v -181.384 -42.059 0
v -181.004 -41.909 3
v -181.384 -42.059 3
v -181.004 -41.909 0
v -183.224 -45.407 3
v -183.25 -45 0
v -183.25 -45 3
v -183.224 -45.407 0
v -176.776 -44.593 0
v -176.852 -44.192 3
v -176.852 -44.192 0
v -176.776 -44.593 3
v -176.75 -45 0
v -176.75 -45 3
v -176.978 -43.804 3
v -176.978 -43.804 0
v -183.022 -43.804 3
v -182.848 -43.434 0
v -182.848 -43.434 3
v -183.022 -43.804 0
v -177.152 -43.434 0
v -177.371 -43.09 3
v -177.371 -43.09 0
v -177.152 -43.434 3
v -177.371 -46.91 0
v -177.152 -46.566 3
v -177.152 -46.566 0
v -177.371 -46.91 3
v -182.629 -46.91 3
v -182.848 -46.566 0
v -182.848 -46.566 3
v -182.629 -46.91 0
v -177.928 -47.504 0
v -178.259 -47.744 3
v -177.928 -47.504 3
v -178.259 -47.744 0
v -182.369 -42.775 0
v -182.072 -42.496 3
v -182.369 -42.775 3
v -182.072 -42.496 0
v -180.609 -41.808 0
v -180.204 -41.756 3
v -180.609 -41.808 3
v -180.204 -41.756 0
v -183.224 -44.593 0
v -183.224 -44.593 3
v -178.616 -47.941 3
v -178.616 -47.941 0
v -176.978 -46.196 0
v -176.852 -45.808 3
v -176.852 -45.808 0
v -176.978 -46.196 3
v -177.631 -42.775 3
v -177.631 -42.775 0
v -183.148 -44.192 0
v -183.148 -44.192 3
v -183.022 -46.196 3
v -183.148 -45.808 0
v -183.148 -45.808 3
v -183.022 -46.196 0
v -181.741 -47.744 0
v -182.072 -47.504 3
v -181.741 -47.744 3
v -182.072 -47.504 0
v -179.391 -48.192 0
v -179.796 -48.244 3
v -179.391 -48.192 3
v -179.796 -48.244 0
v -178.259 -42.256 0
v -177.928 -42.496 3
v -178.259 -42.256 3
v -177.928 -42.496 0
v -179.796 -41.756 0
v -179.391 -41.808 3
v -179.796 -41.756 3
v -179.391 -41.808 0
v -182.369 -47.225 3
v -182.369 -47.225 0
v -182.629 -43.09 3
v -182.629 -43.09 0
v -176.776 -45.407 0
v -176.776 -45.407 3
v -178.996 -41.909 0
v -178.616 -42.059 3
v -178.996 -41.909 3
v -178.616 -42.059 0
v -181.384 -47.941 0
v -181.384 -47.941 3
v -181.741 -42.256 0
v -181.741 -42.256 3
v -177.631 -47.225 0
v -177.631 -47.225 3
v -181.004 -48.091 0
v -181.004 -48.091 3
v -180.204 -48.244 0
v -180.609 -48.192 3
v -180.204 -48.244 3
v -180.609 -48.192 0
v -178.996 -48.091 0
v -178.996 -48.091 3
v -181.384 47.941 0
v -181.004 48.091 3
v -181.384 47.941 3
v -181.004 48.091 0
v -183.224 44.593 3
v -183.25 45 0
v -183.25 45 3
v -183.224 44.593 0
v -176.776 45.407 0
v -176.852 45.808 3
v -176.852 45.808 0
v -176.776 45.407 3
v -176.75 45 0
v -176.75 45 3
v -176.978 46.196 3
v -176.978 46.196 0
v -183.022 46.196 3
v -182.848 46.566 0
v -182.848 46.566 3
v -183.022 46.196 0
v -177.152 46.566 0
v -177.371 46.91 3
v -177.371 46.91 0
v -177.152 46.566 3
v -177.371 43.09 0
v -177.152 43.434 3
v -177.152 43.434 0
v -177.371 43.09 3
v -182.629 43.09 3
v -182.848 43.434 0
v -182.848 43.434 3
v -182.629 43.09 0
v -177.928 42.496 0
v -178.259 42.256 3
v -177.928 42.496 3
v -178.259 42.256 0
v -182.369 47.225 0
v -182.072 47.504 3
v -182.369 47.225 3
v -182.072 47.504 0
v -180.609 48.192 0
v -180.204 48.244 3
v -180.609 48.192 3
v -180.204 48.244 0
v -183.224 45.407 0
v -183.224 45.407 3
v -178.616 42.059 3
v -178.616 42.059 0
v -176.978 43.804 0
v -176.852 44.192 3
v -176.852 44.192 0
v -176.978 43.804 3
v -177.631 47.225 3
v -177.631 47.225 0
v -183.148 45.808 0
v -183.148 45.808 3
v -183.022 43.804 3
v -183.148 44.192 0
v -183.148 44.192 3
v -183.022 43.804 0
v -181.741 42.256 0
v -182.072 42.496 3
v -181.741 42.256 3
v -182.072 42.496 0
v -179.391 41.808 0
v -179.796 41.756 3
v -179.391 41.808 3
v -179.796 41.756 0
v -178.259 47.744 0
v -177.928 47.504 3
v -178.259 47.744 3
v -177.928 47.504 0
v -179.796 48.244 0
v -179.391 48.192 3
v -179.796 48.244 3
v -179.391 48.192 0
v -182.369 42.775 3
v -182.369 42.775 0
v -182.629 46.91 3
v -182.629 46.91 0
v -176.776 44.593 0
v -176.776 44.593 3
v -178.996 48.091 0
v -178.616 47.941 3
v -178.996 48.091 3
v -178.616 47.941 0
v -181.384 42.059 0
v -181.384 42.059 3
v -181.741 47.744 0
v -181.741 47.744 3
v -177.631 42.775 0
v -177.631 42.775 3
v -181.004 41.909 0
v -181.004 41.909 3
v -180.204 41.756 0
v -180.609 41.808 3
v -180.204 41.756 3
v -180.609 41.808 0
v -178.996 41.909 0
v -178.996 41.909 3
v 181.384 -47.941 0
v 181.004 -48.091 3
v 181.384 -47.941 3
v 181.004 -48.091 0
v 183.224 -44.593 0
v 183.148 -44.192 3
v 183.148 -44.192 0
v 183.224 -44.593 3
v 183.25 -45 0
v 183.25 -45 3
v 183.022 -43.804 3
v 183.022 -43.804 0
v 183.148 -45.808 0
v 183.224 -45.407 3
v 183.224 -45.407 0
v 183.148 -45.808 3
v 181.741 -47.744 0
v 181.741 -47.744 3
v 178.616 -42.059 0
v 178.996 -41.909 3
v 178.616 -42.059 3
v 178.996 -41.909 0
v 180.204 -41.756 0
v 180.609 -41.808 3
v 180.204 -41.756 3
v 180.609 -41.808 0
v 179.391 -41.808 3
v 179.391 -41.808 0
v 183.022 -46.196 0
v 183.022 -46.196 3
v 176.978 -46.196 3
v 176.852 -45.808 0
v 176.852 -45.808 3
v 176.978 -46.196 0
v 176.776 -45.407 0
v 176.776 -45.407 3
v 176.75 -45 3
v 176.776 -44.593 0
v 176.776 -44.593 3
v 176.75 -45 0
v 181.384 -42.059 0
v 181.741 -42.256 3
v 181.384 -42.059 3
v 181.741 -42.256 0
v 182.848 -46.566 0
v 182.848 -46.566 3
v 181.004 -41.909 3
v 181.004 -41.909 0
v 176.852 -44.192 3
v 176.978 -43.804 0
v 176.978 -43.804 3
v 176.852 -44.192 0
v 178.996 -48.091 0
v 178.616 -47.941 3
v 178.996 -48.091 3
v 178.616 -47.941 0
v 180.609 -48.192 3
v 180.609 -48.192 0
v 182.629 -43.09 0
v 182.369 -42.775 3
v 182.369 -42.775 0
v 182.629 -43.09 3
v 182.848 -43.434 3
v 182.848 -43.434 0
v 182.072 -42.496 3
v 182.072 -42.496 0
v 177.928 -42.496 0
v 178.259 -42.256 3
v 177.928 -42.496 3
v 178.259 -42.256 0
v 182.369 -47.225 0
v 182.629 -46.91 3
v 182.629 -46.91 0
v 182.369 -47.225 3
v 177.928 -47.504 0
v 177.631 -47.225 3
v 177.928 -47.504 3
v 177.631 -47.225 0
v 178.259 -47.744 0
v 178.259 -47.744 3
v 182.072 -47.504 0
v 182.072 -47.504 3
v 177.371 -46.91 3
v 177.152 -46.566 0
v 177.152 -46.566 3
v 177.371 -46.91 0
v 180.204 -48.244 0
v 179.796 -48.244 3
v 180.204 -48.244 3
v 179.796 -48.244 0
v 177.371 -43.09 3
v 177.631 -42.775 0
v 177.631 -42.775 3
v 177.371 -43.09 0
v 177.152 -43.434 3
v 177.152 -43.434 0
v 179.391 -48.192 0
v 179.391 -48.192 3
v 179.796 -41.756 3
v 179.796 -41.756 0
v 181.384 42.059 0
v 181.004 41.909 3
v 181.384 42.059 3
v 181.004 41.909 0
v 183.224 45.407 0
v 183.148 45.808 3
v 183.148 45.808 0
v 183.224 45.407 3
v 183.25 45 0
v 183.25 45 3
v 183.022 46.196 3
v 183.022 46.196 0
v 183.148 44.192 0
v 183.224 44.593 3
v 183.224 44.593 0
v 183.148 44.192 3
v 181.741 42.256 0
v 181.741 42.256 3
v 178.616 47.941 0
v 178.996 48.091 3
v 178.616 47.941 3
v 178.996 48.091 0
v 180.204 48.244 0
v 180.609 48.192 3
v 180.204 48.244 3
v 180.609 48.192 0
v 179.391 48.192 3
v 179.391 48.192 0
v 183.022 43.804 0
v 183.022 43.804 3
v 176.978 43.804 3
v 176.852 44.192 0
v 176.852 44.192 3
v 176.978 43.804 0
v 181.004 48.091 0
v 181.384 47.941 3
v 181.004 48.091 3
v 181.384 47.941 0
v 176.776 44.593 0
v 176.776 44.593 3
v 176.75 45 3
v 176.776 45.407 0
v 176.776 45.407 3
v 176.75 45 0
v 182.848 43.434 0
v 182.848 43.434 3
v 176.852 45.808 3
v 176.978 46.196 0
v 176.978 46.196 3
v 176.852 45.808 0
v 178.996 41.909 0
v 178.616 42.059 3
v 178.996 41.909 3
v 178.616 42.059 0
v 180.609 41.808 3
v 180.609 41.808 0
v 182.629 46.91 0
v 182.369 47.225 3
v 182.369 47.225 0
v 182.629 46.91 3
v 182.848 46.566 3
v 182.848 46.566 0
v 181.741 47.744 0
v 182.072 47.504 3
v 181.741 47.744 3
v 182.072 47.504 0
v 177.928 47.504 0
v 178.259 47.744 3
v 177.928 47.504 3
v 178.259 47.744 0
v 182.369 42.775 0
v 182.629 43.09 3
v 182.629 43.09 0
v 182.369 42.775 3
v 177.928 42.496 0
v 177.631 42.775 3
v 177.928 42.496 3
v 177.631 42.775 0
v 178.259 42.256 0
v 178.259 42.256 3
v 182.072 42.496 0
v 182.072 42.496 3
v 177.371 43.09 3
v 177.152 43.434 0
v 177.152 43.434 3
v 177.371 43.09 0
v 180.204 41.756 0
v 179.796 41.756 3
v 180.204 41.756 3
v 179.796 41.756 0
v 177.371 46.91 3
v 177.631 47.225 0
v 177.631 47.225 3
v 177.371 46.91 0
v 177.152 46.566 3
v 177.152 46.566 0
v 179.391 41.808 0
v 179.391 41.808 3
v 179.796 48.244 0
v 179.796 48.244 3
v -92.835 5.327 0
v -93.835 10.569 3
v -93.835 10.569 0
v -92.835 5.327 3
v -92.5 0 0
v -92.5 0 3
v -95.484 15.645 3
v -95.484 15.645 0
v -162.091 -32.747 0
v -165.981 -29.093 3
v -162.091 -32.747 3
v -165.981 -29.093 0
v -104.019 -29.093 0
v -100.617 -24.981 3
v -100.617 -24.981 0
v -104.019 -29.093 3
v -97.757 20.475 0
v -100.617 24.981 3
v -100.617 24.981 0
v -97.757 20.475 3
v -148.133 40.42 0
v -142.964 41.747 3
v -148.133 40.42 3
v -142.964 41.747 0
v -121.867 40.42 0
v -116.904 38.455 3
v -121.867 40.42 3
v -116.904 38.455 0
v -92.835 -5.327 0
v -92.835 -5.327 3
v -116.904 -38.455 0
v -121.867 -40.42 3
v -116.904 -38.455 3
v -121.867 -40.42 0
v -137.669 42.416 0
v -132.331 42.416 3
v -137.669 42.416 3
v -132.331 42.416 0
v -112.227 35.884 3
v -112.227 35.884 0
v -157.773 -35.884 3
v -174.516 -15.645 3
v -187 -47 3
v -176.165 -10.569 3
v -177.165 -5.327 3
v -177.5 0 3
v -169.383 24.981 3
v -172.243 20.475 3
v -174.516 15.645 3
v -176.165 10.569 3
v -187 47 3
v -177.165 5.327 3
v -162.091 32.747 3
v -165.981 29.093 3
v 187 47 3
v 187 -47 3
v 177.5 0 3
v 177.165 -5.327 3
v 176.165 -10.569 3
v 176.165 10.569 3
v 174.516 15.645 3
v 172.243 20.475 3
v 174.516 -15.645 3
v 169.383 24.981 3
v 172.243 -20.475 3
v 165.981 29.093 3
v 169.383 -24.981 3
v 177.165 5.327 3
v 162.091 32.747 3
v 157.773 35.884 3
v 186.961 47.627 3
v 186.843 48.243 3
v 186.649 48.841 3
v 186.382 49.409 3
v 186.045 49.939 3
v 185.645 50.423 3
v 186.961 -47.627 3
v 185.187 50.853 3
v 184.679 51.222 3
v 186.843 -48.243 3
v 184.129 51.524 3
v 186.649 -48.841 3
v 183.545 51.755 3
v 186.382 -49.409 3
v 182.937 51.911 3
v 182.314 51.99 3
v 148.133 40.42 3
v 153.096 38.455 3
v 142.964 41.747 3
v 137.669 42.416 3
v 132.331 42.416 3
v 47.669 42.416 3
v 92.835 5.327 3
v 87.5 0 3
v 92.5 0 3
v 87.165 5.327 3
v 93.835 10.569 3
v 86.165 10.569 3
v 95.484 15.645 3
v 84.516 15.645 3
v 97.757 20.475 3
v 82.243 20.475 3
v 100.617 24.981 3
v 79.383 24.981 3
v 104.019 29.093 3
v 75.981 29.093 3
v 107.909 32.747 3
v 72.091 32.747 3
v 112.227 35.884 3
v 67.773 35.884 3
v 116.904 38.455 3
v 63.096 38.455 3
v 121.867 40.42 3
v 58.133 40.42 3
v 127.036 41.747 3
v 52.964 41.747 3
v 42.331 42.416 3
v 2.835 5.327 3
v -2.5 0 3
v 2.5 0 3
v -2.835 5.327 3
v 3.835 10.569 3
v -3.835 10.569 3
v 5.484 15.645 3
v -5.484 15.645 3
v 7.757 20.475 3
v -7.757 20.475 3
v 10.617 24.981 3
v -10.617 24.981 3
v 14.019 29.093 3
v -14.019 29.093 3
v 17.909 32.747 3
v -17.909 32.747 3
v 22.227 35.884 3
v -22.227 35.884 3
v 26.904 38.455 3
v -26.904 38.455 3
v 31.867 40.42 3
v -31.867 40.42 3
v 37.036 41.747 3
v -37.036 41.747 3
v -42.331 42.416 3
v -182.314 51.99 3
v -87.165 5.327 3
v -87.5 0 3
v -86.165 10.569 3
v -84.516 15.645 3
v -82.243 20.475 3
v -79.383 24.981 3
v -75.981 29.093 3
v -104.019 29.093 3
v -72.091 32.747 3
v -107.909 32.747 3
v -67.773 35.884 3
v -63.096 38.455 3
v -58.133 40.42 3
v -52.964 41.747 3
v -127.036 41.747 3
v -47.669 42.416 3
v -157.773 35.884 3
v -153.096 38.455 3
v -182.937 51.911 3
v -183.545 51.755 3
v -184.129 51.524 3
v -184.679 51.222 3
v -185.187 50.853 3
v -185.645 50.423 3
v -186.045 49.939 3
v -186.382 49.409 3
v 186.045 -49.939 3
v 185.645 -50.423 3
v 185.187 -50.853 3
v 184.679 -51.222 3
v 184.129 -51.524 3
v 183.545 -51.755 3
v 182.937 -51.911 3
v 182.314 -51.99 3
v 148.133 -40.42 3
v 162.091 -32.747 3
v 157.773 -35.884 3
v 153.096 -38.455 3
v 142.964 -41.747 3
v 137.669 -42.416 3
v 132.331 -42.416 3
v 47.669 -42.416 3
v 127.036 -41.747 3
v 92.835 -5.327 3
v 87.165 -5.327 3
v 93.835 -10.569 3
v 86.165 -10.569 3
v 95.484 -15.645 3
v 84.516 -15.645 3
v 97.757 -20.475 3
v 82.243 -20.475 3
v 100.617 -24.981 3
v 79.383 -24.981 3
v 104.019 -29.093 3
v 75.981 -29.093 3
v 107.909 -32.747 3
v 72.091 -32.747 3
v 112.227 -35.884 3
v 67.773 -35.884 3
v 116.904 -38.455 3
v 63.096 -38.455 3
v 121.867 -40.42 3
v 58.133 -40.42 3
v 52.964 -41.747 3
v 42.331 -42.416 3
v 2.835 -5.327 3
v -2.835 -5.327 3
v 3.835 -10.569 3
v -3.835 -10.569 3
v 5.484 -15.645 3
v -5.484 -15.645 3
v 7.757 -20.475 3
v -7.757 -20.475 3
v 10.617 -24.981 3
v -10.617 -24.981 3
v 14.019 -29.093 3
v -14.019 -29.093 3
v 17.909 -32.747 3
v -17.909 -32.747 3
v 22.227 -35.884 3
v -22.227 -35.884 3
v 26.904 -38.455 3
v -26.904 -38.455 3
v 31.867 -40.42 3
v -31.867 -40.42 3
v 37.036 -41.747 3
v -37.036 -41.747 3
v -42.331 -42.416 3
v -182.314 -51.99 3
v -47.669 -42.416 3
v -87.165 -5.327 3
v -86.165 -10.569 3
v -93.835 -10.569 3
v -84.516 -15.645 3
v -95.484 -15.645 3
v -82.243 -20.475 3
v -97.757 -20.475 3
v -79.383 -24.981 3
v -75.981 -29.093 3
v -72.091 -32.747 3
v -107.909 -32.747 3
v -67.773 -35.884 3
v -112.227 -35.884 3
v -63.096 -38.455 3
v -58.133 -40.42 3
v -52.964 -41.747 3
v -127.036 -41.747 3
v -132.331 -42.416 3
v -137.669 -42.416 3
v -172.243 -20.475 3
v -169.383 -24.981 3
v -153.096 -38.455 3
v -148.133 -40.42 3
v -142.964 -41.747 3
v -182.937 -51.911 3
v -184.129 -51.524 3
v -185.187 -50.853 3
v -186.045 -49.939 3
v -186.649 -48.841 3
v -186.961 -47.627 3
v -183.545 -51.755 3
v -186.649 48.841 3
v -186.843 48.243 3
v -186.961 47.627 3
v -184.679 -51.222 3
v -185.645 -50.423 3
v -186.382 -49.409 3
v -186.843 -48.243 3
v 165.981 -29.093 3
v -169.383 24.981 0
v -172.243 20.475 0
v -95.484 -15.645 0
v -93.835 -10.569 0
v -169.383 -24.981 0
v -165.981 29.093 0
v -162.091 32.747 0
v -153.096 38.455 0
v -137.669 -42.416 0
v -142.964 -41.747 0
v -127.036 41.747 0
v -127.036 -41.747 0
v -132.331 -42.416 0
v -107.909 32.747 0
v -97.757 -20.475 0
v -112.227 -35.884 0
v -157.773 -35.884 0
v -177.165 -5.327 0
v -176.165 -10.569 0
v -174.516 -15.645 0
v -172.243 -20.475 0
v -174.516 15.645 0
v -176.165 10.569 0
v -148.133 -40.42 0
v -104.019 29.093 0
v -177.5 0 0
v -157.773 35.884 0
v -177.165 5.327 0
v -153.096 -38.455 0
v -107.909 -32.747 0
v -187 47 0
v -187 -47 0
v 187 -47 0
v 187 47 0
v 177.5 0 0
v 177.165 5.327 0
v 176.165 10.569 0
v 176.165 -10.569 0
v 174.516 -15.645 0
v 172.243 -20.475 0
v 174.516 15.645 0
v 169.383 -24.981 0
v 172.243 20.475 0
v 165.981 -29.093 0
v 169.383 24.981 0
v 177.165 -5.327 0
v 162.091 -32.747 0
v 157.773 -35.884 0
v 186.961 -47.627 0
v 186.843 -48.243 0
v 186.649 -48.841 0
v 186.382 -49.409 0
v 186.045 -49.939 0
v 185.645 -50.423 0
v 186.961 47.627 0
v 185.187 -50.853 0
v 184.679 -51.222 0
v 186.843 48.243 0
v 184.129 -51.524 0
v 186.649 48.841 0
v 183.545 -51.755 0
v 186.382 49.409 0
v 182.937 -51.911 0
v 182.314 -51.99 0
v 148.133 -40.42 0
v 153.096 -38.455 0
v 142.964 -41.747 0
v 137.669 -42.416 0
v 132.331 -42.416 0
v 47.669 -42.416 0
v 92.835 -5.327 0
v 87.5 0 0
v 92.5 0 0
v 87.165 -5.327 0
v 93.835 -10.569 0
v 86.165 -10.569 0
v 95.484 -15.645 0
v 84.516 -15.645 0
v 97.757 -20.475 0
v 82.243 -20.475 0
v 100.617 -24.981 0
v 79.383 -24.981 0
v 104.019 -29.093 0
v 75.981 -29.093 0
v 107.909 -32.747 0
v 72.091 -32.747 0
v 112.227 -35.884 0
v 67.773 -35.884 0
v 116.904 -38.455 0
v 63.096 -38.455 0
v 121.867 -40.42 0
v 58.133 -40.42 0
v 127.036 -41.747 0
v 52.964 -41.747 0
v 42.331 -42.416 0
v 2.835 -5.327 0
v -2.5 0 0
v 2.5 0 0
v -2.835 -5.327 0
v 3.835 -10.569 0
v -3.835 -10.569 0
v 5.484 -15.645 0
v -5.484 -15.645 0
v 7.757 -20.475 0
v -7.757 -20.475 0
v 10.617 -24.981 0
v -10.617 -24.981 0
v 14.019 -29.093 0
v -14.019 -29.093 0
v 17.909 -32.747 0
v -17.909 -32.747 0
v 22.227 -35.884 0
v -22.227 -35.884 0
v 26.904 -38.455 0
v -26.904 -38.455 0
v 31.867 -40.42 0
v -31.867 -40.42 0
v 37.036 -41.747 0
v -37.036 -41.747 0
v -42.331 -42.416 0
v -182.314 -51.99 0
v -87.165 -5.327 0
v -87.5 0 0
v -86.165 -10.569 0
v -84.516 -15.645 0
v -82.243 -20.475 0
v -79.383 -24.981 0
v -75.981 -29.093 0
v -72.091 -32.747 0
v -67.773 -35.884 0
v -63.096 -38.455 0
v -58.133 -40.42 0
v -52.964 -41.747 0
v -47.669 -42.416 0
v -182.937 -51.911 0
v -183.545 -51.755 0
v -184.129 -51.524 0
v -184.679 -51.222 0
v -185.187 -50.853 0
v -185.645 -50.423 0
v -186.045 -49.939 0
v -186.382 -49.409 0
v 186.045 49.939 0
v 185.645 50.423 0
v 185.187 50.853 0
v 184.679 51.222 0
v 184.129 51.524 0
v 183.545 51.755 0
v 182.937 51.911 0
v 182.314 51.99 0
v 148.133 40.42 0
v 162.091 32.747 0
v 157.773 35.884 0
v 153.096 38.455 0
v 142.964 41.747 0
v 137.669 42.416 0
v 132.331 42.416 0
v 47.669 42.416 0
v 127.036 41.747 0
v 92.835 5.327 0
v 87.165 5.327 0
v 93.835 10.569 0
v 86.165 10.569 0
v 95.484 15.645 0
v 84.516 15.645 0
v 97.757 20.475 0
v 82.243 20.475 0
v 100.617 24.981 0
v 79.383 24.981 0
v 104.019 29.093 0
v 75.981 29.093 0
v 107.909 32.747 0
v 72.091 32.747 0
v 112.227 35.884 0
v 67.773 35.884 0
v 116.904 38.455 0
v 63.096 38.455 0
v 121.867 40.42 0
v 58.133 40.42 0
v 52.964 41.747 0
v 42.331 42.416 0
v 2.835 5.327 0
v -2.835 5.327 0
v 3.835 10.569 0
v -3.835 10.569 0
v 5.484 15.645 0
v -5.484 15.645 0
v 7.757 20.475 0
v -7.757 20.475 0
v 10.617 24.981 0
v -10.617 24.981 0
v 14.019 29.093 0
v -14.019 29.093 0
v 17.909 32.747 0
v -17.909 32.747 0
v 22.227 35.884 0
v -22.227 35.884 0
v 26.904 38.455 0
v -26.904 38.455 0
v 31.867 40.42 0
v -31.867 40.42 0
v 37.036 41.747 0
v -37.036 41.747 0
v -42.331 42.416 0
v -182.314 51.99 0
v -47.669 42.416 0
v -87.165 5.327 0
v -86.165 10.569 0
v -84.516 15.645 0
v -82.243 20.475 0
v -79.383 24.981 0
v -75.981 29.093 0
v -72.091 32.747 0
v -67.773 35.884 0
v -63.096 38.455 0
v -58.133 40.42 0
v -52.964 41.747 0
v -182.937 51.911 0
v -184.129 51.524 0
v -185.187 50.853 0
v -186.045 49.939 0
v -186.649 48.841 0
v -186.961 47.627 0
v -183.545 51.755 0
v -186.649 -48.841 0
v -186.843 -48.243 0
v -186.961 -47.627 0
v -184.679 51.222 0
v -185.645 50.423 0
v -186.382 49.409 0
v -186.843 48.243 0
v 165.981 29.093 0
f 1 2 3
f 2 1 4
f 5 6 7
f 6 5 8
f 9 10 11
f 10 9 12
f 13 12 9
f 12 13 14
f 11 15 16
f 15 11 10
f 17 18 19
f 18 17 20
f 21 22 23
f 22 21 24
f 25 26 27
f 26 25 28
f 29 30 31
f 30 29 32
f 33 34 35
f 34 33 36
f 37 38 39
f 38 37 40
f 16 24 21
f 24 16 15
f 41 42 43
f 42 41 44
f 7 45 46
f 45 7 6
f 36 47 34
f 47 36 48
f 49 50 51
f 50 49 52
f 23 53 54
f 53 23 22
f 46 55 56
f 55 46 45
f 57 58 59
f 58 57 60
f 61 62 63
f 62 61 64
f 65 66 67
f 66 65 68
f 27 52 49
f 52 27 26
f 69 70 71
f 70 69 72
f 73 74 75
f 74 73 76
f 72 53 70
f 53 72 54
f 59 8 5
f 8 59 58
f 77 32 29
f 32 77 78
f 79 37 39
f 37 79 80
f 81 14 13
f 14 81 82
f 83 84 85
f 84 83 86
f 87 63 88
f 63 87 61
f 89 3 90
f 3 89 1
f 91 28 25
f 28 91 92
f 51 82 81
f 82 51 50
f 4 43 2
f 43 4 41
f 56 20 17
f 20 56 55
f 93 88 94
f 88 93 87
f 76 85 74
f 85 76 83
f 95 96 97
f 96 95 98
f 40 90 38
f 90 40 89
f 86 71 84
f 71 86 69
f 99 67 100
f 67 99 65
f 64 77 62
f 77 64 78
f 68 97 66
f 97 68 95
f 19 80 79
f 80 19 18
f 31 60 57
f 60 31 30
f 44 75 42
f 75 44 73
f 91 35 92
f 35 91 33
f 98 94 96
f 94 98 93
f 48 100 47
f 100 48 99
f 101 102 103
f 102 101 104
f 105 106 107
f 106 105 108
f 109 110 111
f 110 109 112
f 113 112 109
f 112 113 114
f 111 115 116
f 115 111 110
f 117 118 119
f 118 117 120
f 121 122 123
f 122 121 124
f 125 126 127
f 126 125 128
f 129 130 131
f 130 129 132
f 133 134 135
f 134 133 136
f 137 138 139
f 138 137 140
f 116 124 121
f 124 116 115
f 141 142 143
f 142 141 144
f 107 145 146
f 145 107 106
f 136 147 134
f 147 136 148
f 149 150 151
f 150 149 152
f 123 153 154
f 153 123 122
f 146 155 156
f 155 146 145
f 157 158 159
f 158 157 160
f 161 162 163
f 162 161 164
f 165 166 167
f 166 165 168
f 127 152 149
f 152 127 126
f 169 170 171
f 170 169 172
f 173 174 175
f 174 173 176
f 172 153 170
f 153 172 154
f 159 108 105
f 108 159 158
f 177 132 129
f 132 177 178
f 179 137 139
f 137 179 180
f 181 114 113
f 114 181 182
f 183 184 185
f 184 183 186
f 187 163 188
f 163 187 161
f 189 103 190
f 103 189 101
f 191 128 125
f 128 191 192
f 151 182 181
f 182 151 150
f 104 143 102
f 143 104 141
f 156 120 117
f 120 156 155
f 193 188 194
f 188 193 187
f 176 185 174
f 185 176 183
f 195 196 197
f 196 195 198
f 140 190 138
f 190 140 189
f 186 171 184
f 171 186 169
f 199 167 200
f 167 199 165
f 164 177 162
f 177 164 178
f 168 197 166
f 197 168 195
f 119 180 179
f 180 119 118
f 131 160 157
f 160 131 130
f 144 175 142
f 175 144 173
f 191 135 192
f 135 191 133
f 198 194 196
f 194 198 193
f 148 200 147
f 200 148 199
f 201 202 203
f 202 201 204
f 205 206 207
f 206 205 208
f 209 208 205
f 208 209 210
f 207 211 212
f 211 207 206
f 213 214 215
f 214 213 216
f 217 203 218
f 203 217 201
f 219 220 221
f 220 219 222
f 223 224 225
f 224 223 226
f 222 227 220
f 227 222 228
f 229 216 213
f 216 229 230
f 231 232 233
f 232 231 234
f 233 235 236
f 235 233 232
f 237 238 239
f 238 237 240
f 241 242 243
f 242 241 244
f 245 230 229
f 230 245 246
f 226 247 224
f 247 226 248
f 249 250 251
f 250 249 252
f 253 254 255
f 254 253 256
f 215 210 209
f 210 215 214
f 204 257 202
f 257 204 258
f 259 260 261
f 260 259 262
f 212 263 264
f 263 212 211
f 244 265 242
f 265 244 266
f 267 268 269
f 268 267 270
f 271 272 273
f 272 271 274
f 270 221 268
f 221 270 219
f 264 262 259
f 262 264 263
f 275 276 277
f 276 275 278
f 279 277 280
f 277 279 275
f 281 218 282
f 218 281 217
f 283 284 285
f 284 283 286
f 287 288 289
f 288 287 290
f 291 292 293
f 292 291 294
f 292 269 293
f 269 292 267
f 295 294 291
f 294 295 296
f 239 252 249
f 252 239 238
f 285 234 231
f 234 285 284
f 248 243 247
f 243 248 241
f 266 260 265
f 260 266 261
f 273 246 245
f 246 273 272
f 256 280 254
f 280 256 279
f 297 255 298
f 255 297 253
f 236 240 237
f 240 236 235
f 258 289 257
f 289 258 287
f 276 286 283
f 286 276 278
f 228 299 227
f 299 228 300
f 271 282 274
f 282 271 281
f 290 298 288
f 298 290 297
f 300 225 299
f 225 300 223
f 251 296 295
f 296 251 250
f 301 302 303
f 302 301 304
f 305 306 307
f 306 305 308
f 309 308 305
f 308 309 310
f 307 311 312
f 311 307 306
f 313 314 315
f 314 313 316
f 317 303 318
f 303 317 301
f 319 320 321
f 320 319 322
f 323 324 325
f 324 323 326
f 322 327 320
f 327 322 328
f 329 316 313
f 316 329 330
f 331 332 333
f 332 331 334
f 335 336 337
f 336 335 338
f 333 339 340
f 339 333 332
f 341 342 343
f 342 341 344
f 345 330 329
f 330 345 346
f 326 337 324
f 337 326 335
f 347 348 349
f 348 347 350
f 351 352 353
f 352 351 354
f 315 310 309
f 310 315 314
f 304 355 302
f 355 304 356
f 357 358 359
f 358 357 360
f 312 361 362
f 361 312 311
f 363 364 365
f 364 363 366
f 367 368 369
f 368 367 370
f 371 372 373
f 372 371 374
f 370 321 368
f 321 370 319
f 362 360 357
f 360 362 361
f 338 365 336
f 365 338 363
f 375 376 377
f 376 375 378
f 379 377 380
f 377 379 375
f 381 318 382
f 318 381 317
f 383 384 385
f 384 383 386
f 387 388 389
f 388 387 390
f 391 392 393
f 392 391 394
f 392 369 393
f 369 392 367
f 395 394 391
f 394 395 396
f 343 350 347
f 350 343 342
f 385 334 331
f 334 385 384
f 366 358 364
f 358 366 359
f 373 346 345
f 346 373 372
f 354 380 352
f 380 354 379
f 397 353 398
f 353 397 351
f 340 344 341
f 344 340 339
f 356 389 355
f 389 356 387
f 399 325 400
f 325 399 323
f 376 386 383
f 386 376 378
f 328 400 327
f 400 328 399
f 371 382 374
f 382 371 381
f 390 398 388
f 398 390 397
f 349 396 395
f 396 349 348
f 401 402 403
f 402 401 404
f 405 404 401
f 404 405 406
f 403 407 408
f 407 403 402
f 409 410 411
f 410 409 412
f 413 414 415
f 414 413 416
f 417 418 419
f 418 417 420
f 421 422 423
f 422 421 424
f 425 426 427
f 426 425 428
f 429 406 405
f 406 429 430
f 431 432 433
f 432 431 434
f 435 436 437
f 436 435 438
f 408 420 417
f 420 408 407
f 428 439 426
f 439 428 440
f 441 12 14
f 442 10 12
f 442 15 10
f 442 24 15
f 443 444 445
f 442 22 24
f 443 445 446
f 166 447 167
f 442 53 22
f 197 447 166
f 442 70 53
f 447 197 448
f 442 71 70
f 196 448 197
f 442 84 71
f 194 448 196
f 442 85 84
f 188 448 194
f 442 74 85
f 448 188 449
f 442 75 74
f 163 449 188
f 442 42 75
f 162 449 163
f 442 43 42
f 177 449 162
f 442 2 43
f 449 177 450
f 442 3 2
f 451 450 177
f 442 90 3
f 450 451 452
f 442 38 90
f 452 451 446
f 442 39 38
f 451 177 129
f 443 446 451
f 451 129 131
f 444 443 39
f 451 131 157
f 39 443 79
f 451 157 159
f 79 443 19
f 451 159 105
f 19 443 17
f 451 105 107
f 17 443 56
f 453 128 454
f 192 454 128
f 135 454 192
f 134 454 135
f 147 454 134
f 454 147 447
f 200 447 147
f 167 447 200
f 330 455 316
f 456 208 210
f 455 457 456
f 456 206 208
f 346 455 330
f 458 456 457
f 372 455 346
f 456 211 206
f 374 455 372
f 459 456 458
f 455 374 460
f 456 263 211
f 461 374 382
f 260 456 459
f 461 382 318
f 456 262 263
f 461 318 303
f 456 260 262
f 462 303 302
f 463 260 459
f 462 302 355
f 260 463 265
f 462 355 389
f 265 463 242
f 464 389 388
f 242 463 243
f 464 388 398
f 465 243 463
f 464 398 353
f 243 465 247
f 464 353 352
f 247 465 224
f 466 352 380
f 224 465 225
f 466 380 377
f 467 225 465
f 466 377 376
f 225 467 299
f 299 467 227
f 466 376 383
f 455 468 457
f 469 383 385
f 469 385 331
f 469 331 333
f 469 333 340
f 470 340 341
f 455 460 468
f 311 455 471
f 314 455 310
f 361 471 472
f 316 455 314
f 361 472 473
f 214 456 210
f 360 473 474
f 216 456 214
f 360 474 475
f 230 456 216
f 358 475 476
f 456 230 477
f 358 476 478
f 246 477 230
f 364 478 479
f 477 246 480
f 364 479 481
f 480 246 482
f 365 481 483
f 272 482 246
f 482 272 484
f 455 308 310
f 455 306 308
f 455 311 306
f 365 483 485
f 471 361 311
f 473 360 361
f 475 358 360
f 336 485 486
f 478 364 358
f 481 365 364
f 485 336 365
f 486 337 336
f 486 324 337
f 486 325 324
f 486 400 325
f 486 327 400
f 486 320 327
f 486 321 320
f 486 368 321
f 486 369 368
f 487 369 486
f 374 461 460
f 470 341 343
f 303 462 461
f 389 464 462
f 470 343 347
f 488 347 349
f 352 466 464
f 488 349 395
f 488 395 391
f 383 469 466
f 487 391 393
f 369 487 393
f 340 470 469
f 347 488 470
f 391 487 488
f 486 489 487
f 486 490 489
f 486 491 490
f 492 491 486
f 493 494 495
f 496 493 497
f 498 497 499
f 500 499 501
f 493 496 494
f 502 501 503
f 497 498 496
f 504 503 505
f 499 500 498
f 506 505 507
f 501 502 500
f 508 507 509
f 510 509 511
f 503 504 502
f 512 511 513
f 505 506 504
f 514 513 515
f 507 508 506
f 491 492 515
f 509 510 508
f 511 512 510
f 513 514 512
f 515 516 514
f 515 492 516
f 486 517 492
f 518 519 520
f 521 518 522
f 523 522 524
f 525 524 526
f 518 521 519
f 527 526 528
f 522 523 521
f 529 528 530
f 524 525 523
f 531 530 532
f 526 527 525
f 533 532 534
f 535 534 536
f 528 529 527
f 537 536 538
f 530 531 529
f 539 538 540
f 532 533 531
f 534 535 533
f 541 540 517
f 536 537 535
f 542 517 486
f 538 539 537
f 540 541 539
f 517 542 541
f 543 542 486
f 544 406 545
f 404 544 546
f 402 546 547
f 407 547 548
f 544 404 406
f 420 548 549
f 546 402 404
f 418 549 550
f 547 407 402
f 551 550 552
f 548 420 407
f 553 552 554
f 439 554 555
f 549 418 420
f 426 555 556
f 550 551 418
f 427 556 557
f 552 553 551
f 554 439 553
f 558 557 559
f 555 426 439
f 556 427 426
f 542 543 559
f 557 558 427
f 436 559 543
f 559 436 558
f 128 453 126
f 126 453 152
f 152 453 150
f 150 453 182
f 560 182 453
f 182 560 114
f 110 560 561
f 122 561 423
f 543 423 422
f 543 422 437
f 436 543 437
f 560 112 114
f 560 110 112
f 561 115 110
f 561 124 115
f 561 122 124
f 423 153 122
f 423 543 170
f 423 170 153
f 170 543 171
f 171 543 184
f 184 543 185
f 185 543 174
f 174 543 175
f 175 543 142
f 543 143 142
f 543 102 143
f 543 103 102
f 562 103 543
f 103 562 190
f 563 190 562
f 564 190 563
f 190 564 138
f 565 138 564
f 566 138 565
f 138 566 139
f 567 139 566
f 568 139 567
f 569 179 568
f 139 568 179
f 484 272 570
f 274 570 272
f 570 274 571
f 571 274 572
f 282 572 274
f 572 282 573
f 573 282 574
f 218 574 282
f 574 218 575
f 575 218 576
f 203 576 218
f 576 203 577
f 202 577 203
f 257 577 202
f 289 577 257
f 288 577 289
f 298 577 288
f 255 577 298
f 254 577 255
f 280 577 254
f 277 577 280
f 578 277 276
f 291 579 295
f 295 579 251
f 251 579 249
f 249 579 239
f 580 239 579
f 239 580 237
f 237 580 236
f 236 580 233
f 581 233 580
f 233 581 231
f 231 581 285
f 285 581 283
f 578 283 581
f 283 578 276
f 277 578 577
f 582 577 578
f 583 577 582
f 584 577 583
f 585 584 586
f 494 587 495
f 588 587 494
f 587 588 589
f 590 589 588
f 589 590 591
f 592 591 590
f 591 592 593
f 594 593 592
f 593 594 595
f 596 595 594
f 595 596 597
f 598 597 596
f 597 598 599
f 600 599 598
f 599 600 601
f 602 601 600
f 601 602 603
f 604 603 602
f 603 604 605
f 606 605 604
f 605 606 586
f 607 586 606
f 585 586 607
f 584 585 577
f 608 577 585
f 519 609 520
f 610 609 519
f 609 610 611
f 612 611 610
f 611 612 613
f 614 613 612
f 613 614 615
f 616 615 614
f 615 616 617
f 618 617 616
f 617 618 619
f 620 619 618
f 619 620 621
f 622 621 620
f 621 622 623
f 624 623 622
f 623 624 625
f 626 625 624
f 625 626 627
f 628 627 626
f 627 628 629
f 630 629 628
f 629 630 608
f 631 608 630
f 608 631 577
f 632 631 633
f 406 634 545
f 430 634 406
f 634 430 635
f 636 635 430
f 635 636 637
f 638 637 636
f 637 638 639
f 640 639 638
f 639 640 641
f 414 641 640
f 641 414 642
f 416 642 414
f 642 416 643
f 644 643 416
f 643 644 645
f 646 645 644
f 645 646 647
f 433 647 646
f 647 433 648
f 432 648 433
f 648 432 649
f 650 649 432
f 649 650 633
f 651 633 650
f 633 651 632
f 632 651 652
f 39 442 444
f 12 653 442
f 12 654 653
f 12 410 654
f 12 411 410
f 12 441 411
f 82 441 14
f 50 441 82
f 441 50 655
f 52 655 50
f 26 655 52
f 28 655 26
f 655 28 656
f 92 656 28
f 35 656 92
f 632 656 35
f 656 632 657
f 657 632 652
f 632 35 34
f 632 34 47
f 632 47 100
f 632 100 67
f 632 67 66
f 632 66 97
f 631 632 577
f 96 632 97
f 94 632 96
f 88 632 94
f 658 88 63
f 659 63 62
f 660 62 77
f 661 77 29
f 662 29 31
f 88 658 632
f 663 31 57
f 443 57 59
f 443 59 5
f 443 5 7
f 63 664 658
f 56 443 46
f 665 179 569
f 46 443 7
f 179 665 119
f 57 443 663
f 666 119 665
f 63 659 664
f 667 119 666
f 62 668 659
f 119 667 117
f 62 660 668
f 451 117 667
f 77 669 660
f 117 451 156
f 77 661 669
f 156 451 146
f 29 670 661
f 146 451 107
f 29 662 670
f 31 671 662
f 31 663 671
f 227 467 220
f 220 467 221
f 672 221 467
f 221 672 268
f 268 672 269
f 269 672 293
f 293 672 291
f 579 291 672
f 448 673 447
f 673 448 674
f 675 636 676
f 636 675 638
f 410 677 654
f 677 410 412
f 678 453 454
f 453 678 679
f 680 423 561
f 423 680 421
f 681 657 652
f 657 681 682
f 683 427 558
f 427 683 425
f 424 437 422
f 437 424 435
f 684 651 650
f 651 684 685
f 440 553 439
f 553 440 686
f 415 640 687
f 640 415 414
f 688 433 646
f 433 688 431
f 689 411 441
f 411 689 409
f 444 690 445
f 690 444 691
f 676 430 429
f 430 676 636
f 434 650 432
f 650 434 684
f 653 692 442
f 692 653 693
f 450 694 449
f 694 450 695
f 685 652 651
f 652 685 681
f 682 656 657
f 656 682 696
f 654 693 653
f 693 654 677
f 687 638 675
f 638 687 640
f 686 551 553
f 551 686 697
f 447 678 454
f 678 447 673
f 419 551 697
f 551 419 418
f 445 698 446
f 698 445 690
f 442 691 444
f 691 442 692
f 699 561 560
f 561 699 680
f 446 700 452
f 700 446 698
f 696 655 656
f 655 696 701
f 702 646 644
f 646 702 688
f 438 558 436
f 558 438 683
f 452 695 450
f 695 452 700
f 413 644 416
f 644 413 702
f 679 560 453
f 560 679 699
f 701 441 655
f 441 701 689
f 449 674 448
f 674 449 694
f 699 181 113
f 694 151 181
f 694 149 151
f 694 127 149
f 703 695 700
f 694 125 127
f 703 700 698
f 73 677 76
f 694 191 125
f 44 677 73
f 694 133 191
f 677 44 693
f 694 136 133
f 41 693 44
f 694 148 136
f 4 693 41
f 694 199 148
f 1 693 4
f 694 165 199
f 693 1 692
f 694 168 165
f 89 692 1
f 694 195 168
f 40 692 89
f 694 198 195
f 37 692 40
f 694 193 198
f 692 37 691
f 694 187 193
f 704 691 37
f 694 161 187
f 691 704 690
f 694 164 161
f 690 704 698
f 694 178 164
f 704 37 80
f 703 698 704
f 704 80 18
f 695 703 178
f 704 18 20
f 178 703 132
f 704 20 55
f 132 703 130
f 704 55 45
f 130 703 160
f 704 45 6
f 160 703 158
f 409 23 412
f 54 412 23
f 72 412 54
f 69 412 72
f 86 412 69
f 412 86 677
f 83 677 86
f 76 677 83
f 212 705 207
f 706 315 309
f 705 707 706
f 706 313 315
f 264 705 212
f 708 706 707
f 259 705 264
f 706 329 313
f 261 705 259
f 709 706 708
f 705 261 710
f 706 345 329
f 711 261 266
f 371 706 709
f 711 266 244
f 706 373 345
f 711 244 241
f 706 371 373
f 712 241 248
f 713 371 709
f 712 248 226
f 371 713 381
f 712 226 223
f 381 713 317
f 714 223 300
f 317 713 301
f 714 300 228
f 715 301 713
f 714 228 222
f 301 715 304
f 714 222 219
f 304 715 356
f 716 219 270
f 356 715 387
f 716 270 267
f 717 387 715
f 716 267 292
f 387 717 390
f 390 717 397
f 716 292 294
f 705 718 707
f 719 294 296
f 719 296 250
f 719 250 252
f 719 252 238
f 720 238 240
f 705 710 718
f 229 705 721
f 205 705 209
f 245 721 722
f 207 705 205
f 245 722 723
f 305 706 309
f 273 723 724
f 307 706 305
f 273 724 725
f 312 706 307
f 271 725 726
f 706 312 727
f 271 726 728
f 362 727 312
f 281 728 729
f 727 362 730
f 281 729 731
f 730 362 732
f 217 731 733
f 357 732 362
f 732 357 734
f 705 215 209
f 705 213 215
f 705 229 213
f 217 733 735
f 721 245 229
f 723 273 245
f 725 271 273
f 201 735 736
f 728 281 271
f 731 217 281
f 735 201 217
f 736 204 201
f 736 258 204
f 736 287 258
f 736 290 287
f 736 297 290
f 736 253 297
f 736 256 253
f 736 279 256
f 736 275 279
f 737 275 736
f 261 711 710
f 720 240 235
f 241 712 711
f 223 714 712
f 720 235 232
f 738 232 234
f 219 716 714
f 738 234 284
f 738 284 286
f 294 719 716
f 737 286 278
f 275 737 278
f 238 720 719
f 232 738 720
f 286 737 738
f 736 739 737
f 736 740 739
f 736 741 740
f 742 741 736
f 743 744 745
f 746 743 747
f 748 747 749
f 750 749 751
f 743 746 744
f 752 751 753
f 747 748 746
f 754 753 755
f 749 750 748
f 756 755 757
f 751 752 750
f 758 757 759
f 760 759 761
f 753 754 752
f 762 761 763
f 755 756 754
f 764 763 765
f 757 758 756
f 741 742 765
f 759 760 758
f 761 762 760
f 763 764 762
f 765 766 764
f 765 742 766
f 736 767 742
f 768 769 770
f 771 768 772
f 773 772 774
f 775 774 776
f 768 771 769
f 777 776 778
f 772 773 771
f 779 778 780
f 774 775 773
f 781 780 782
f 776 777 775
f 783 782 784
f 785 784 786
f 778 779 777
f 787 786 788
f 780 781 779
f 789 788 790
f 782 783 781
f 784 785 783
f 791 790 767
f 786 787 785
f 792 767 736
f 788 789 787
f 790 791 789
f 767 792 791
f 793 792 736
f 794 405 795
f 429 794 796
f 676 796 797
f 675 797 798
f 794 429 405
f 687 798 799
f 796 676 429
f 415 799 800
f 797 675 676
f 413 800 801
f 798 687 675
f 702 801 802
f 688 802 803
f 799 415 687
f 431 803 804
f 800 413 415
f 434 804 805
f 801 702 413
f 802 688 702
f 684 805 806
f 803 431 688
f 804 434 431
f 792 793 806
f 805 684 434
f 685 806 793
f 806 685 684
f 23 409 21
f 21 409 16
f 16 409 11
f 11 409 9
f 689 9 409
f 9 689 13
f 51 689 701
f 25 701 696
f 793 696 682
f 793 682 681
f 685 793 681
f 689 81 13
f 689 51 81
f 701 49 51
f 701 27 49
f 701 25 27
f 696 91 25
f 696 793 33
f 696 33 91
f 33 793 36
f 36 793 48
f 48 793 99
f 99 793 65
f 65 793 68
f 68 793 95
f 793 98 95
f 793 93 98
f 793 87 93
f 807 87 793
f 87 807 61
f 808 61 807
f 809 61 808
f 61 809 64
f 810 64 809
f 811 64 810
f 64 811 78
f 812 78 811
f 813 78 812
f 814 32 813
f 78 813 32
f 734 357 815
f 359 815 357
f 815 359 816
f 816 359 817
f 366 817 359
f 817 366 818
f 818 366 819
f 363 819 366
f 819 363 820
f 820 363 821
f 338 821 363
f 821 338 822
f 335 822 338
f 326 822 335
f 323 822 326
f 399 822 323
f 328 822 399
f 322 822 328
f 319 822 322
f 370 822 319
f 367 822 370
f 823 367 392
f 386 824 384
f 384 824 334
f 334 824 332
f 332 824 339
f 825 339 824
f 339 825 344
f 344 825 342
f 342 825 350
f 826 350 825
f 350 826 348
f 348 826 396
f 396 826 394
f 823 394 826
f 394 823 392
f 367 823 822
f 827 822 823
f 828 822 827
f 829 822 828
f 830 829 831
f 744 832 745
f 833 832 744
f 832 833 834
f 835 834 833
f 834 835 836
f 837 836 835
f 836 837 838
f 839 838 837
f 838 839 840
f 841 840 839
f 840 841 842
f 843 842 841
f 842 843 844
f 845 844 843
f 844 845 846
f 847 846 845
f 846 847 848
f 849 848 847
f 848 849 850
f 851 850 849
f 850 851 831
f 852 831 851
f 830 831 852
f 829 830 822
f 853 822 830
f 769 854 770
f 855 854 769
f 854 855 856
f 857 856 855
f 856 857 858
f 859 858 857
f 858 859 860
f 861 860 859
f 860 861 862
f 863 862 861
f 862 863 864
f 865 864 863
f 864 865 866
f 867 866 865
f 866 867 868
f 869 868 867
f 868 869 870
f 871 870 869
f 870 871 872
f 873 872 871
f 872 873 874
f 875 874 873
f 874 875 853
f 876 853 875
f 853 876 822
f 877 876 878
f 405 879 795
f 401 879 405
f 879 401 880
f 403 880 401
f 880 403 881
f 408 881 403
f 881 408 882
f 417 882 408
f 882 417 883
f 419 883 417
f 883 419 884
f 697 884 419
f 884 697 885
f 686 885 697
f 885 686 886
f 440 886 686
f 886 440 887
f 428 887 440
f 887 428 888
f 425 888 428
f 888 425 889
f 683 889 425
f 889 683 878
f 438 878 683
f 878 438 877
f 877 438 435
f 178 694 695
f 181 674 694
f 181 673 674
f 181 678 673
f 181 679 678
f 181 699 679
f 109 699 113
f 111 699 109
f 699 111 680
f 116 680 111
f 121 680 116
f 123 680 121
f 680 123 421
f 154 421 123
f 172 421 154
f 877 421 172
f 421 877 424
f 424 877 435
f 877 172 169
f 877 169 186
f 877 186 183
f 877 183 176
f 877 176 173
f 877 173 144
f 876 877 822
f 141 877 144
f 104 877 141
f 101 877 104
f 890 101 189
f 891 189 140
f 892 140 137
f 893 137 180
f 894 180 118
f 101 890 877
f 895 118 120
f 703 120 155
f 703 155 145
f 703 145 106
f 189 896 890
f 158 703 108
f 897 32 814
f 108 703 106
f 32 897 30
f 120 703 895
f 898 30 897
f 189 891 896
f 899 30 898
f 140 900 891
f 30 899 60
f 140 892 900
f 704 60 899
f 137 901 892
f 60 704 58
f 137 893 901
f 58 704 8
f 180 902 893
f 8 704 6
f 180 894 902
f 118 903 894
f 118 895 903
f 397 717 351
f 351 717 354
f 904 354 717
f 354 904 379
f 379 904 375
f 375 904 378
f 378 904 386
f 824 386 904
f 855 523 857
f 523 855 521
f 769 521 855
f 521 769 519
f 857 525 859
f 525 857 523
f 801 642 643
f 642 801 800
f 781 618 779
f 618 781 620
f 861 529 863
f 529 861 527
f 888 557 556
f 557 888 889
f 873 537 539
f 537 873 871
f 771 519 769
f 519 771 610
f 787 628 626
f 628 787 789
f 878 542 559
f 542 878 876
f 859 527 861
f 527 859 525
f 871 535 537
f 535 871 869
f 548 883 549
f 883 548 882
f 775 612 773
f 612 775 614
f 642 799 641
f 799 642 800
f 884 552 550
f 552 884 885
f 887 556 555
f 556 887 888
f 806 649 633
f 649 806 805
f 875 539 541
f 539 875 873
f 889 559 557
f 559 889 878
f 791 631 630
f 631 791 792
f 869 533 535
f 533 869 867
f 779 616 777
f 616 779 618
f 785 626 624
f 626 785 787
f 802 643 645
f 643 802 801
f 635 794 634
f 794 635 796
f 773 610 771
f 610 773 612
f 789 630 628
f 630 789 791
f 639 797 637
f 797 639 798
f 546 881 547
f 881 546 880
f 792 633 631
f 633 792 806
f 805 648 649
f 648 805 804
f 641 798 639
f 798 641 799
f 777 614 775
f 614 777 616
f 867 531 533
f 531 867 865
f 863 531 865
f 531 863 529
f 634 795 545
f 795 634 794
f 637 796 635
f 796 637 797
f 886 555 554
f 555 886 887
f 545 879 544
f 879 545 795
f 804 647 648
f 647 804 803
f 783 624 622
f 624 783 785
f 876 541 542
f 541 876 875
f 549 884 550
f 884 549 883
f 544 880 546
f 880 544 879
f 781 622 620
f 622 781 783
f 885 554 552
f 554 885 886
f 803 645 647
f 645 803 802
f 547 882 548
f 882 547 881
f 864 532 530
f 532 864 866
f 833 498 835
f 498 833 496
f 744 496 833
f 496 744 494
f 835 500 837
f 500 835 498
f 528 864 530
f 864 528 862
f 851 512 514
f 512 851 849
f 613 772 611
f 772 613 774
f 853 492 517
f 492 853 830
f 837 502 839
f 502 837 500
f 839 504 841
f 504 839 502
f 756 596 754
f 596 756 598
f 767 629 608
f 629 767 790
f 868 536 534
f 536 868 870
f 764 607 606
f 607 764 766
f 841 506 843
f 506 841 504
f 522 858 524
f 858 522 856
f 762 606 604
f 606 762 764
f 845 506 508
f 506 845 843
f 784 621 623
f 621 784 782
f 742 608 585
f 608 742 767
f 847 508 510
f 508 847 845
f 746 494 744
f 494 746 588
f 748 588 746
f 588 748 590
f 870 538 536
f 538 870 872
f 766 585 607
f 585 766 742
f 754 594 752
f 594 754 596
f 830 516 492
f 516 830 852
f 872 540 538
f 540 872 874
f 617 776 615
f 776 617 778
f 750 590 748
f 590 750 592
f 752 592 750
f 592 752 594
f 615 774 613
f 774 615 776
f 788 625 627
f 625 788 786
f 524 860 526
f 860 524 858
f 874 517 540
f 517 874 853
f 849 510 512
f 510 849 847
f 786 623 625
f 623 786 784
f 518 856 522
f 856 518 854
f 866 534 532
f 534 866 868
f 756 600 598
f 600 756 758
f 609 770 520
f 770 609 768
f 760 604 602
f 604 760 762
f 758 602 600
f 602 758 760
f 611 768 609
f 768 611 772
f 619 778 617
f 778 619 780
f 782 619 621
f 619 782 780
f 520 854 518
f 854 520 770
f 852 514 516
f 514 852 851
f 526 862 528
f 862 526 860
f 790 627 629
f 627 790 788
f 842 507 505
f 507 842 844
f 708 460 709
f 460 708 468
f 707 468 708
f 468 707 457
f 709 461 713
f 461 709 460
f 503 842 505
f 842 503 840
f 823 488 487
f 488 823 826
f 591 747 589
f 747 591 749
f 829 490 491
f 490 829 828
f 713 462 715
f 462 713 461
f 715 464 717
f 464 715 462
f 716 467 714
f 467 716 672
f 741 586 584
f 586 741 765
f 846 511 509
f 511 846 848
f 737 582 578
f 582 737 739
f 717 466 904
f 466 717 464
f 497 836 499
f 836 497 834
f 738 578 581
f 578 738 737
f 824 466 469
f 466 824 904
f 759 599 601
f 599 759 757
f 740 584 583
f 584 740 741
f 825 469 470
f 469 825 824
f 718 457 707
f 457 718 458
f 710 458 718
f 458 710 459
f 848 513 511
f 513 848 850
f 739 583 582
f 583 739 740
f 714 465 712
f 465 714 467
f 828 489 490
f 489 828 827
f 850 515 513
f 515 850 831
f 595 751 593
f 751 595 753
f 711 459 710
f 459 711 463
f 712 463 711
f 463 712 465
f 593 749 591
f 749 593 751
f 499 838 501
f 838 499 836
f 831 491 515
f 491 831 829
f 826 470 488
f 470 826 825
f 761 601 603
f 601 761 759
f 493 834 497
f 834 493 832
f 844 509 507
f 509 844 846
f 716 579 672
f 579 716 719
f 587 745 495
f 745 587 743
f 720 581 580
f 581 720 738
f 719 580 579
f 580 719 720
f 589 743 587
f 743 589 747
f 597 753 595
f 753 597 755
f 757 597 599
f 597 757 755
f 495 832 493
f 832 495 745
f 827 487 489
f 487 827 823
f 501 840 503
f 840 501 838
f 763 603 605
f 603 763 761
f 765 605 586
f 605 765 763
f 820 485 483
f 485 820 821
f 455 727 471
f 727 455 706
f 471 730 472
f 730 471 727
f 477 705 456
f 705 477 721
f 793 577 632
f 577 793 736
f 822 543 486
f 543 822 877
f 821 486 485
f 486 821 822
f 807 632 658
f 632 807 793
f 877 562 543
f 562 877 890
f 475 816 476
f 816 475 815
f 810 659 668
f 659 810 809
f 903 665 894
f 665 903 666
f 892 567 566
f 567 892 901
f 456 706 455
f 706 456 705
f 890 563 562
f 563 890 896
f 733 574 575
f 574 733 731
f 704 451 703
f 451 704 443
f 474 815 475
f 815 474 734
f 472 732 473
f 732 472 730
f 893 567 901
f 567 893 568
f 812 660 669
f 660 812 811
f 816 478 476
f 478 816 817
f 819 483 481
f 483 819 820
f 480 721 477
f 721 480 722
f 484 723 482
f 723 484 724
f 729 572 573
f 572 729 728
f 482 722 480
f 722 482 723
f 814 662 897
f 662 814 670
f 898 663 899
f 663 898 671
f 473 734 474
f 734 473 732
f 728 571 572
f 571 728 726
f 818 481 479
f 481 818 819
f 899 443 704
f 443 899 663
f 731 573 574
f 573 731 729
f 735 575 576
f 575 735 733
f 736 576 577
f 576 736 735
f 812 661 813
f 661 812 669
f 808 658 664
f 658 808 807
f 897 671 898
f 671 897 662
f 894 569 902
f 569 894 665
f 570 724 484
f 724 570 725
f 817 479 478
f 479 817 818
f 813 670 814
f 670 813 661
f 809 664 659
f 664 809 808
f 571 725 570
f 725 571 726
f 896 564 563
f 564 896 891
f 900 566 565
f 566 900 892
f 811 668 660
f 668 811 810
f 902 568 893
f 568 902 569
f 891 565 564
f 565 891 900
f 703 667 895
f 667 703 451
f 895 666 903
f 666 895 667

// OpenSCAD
$fn = 50;


difference() {
	union() {
		hull() {
			translate(v = [-182.0000000000, 47.0000000000, 0]) {
				cylinder(h = 3, r = 5);
			}
			translate(v = [182.0000000000, 47.0000000000, 0]) {
				cylinder(h = 3, r = 5);
			}
			translate(v = [-182.0000000000, -47.0000000000, 0]) {
				cylinder(h = 3, r = 5);
			}
			translate(v = [182.0000000000, -47.0000000000, 0]) {
				cylinder(h = 3, r = 5);
			}
		}
	}
	union() {
		#translate(v = [-180.0000000000, -45.0000000000, -100.0000000000]) {
			cylinder(h = 200, r = 3.2500000000);
		}
		#translate(v = [-180.0000000000, 45.0000000000, -100.0000000000]) {
			cylinder(h = 200, r = 3.2500000000);
		}
		#translate(v = [180.0000000000, -45.0000000000, -100.0000000000]) {
			cylinder(h = 200, r = 3.2500000000);
		}
		#translate(v = [180.0000000000, 45.0000000000, -100.0000000000]) {
			cylinder(h = 200, r = 3.2500000000);
		}
		#translate(v = [-135.0000000000, 0, 0]) {
			cylinder(h = 3, r = 42.5000000000);
		}
		#translate(v = [-45.0000000000, 0, 0]) {
			cylinder(h = 3, r = 42.5000000000);
		}
		#translate(v = [45.0000000000, 0, 0]) {
			cylinder(h = 3, r = 42.5000000000);
		}
		#translate(v = [135.0000000000, 0, 0]) {
			cylinder(h = 3, r = 42.5000000000);
		}
	}
}
